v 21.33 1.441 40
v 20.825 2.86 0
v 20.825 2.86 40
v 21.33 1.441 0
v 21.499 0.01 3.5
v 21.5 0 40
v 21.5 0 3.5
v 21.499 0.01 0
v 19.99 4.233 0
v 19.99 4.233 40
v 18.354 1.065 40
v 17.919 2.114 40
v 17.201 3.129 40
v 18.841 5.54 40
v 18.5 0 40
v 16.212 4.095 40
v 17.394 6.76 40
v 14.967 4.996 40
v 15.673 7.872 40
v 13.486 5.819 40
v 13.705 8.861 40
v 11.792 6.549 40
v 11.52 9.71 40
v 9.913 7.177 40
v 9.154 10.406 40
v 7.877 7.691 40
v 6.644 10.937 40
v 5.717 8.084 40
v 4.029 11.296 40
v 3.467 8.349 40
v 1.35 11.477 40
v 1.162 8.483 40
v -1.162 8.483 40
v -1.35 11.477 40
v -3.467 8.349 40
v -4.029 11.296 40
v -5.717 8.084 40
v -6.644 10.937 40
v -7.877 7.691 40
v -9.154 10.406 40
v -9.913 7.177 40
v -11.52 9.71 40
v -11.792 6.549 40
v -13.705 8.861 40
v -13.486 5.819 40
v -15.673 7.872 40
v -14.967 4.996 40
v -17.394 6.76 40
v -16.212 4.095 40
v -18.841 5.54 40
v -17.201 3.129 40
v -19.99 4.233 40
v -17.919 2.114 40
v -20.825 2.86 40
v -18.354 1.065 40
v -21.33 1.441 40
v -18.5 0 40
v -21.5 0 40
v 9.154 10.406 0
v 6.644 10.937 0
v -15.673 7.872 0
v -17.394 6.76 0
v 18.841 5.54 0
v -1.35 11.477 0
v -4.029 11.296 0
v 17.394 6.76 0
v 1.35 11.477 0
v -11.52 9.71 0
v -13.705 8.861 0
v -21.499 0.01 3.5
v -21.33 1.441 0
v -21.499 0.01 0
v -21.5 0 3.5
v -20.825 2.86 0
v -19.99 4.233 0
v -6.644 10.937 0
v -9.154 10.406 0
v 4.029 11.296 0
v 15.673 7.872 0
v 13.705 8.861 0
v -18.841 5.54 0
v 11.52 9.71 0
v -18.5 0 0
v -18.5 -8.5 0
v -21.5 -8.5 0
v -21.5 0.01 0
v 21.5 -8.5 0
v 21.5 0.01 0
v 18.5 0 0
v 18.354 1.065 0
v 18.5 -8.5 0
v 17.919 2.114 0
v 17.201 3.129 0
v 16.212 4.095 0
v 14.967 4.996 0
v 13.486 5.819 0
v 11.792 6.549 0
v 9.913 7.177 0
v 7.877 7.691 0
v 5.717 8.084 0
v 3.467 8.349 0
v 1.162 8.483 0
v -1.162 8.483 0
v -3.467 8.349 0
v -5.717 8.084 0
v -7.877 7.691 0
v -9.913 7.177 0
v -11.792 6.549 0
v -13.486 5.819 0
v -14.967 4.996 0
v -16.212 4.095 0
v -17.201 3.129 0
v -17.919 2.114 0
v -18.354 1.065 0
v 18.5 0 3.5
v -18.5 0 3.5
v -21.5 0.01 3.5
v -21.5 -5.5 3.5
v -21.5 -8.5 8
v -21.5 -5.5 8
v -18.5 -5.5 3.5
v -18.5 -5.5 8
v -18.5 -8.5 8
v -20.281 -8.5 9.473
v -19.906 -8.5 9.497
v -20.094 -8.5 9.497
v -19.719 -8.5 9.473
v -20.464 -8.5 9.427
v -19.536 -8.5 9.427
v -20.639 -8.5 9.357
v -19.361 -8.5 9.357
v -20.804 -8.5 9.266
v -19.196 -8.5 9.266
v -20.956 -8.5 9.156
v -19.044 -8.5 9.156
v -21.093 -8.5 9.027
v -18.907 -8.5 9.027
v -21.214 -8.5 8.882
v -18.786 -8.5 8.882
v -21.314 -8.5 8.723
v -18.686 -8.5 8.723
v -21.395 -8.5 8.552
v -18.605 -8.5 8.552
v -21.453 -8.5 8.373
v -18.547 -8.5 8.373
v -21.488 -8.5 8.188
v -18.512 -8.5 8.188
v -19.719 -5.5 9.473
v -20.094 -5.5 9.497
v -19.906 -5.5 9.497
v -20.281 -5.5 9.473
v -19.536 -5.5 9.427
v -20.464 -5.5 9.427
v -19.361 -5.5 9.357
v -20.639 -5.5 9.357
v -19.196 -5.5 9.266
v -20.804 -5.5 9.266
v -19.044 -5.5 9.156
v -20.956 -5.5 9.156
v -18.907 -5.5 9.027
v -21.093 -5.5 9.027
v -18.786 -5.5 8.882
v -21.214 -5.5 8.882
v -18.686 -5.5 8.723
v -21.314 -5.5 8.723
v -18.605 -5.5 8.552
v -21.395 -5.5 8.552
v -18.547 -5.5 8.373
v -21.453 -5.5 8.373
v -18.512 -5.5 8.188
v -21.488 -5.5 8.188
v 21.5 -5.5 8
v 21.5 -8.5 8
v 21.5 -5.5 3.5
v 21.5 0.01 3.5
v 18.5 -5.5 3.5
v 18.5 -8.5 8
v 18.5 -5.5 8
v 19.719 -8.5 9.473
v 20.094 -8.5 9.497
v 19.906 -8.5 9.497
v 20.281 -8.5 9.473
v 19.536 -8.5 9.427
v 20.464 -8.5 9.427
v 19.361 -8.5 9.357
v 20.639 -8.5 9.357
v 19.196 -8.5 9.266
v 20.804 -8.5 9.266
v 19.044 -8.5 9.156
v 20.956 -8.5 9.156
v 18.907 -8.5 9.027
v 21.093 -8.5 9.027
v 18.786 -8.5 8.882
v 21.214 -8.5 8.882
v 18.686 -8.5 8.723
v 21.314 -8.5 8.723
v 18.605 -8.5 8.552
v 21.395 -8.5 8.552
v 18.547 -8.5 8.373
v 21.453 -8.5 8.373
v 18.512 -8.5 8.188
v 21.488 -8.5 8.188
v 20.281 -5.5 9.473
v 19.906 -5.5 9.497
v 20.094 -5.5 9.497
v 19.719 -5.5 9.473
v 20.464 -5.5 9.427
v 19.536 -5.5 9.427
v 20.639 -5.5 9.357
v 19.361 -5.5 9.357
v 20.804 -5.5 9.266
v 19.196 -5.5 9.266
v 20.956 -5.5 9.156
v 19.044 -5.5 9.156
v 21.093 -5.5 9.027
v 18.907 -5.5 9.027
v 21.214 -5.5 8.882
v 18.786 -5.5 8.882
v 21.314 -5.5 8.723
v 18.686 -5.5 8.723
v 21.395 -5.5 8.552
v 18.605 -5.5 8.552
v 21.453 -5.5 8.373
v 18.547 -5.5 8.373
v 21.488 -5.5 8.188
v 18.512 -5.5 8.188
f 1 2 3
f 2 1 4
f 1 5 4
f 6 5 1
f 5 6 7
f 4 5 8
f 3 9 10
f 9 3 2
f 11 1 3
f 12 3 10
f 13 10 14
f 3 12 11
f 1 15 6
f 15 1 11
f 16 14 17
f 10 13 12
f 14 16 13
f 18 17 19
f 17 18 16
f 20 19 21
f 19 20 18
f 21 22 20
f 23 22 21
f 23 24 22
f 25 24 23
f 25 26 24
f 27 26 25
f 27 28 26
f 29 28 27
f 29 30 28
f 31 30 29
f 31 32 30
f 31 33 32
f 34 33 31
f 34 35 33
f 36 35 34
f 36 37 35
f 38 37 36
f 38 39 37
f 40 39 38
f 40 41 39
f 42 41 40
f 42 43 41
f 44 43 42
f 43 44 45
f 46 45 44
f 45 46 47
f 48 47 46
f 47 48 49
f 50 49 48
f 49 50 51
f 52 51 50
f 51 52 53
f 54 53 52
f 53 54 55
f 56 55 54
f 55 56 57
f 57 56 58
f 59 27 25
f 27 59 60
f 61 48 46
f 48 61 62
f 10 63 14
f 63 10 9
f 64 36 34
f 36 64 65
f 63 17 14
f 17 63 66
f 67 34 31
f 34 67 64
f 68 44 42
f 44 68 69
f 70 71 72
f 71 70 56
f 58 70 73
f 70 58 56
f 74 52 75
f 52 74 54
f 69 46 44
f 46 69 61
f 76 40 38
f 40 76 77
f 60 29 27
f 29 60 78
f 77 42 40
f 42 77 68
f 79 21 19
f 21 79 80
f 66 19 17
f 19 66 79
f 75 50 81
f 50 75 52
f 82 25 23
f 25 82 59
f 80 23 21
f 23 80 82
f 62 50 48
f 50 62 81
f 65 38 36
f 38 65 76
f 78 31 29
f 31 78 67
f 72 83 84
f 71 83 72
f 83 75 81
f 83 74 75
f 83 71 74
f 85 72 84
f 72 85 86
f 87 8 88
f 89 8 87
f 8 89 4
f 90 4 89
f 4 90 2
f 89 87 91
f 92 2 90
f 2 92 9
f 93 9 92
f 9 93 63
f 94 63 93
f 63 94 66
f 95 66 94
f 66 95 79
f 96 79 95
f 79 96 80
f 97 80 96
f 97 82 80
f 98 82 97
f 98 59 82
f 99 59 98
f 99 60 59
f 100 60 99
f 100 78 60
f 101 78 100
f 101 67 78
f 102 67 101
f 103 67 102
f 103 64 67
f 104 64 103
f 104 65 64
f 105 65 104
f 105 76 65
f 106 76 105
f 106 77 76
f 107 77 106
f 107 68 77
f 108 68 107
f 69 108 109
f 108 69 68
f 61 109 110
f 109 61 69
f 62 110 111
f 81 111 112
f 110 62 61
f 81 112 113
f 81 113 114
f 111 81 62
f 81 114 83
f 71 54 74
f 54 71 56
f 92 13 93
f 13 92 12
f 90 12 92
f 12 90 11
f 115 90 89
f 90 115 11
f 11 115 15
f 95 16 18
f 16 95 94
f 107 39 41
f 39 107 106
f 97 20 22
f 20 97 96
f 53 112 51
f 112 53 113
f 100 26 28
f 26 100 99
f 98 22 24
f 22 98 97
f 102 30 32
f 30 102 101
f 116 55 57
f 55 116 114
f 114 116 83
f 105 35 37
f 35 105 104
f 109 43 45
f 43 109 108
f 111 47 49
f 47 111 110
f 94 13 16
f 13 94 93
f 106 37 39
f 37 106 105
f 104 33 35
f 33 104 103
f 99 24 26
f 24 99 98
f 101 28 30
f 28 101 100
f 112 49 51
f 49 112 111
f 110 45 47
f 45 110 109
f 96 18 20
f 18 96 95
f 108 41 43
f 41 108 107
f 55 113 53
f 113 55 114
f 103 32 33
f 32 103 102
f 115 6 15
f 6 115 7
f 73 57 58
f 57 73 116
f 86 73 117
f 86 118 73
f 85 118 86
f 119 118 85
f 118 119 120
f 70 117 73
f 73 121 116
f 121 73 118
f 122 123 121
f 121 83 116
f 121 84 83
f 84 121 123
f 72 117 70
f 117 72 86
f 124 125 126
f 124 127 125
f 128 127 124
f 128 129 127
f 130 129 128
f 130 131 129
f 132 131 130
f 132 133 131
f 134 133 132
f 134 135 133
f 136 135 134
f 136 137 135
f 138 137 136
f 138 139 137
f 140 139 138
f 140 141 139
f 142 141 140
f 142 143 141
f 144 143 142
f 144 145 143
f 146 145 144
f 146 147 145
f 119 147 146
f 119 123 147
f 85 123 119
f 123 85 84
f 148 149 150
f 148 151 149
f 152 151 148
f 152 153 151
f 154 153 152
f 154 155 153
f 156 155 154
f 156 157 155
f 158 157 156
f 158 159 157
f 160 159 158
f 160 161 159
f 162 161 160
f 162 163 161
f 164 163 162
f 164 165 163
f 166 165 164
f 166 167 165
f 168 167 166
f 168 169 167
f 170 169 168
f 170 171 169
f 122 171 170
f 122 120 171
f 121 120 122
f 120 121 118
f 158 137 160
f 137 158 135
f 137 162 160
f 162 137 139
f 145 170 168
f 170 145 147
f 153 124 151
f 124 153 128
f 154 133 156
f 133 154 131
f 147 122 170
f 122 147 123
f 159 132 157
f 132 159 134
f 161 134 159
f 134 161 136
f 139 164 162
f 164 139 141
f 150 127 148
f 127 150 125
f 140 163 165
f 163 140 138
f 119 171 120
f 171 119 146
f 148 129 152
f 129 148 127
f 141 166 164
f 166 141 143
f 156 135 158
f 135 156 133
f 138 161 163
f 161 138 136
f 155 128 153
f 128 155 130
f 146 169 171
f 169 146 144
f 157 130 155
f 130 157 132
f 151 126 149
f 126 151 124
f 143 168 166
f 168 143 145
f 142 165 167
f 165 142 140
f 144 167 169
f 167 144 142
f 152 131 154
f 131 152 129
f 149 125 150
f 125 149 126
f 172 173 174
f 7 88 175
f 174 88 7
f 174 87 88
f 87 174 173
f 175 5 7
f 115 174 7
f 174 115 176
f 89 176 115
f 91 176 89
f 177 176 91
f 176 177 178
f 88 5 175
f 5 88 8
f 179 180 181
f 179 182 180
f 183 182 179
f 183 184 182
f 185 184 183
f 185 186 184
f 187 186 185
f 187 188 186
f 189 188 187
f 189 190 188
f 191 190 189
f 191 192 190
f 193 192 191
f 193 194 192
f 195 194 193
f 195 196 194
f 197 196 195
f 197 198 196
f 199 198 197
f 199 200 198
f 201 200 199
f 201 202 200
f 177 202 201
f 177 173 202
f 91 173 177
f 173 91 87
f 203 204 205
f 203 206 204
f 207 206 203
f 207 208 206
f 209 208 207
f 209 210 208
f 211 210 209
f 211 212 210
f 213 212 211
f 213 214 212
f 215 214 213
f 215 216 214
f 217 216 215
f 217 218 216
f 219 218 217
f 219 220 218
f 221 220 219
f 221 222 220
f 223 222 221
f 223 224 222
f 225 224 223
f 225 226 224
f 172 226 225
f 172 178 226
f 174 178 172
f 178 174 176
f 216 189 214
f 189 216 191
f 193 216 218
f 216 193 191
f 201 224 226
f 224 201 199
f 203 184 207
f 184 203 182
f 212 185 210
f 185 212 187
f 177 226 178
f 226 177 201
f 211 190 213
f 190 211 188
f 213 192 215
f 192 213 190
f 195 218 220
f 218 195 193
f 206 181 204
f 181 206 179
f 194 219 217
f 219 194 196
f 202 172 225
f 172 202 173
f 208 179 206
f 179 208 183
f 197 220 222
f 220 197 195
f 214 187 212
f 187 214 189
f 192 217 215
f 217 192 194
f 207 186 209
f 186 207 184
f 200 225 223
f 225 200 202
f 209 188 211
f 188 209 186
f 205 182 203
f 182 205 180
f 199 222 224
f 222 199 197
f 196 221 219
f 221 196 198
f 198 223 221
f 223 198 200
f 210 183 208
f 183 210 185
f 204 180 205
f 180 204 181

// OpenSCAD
HOLE_DIST_X = 40;
HOLE_SIZE_X = 5;
HOLE_DIST_Z = 40;
HOLE_SIZE_Z = 14;
BOARD_THICK = 4.5;
BULGE = 10;
TOL = 1;
EPS = 0.01;

$fn = 50;
halfthick = HOLE_SIZE_X/2-TOL;
fullthick = halfthick*2;

module nudge_negz () {
    translate ([0, 0, -EPS]) children();
}

difference () {
    scale ([HOLE_DIST_X/2+halfthick, BULGE+halfthick, 1]) {
        cylinder (HOLE_DIST_Z, r=1);
    }
    scale ([HOLE_DIST_X/2-halfthick, BULGE-halfthick, 1]) nudge_negz () {
        cylinder (HOLE_DIST_Z+TOL, r=1);
    }
    translate ([-HOLE_DIST_X, -BULGE*2, -EPS]) {
        cube ([HOLE_DIST_X*2, BULGE*2, HOLE_DIST_Z+TOL]);
    }
}

for (x=[-1,1]) scale ([x, 1, 1]) {
    translate ([HOLE_DIST_X/2-halfthick, -BOARD_THICK-TOL-fullthick, 0]) {
        cube ([
            halfthick*2,
            BOARD_THICK+TOL+fullthick+EPS,
            HOLE_SIZE_Z/4,
        ]);
        hull () {
            cube ([
                halfthick*2,
                fullthick,
                EPS,
            ]);
            translate ([halfthick, 0, HOLE_SIZE_Z-HOLE_SIZE_X-TOL]) {
                rotate ([-90, 0, 0]) cylinder (fullthick, r=halfthick);
            }
        }
    }
}
